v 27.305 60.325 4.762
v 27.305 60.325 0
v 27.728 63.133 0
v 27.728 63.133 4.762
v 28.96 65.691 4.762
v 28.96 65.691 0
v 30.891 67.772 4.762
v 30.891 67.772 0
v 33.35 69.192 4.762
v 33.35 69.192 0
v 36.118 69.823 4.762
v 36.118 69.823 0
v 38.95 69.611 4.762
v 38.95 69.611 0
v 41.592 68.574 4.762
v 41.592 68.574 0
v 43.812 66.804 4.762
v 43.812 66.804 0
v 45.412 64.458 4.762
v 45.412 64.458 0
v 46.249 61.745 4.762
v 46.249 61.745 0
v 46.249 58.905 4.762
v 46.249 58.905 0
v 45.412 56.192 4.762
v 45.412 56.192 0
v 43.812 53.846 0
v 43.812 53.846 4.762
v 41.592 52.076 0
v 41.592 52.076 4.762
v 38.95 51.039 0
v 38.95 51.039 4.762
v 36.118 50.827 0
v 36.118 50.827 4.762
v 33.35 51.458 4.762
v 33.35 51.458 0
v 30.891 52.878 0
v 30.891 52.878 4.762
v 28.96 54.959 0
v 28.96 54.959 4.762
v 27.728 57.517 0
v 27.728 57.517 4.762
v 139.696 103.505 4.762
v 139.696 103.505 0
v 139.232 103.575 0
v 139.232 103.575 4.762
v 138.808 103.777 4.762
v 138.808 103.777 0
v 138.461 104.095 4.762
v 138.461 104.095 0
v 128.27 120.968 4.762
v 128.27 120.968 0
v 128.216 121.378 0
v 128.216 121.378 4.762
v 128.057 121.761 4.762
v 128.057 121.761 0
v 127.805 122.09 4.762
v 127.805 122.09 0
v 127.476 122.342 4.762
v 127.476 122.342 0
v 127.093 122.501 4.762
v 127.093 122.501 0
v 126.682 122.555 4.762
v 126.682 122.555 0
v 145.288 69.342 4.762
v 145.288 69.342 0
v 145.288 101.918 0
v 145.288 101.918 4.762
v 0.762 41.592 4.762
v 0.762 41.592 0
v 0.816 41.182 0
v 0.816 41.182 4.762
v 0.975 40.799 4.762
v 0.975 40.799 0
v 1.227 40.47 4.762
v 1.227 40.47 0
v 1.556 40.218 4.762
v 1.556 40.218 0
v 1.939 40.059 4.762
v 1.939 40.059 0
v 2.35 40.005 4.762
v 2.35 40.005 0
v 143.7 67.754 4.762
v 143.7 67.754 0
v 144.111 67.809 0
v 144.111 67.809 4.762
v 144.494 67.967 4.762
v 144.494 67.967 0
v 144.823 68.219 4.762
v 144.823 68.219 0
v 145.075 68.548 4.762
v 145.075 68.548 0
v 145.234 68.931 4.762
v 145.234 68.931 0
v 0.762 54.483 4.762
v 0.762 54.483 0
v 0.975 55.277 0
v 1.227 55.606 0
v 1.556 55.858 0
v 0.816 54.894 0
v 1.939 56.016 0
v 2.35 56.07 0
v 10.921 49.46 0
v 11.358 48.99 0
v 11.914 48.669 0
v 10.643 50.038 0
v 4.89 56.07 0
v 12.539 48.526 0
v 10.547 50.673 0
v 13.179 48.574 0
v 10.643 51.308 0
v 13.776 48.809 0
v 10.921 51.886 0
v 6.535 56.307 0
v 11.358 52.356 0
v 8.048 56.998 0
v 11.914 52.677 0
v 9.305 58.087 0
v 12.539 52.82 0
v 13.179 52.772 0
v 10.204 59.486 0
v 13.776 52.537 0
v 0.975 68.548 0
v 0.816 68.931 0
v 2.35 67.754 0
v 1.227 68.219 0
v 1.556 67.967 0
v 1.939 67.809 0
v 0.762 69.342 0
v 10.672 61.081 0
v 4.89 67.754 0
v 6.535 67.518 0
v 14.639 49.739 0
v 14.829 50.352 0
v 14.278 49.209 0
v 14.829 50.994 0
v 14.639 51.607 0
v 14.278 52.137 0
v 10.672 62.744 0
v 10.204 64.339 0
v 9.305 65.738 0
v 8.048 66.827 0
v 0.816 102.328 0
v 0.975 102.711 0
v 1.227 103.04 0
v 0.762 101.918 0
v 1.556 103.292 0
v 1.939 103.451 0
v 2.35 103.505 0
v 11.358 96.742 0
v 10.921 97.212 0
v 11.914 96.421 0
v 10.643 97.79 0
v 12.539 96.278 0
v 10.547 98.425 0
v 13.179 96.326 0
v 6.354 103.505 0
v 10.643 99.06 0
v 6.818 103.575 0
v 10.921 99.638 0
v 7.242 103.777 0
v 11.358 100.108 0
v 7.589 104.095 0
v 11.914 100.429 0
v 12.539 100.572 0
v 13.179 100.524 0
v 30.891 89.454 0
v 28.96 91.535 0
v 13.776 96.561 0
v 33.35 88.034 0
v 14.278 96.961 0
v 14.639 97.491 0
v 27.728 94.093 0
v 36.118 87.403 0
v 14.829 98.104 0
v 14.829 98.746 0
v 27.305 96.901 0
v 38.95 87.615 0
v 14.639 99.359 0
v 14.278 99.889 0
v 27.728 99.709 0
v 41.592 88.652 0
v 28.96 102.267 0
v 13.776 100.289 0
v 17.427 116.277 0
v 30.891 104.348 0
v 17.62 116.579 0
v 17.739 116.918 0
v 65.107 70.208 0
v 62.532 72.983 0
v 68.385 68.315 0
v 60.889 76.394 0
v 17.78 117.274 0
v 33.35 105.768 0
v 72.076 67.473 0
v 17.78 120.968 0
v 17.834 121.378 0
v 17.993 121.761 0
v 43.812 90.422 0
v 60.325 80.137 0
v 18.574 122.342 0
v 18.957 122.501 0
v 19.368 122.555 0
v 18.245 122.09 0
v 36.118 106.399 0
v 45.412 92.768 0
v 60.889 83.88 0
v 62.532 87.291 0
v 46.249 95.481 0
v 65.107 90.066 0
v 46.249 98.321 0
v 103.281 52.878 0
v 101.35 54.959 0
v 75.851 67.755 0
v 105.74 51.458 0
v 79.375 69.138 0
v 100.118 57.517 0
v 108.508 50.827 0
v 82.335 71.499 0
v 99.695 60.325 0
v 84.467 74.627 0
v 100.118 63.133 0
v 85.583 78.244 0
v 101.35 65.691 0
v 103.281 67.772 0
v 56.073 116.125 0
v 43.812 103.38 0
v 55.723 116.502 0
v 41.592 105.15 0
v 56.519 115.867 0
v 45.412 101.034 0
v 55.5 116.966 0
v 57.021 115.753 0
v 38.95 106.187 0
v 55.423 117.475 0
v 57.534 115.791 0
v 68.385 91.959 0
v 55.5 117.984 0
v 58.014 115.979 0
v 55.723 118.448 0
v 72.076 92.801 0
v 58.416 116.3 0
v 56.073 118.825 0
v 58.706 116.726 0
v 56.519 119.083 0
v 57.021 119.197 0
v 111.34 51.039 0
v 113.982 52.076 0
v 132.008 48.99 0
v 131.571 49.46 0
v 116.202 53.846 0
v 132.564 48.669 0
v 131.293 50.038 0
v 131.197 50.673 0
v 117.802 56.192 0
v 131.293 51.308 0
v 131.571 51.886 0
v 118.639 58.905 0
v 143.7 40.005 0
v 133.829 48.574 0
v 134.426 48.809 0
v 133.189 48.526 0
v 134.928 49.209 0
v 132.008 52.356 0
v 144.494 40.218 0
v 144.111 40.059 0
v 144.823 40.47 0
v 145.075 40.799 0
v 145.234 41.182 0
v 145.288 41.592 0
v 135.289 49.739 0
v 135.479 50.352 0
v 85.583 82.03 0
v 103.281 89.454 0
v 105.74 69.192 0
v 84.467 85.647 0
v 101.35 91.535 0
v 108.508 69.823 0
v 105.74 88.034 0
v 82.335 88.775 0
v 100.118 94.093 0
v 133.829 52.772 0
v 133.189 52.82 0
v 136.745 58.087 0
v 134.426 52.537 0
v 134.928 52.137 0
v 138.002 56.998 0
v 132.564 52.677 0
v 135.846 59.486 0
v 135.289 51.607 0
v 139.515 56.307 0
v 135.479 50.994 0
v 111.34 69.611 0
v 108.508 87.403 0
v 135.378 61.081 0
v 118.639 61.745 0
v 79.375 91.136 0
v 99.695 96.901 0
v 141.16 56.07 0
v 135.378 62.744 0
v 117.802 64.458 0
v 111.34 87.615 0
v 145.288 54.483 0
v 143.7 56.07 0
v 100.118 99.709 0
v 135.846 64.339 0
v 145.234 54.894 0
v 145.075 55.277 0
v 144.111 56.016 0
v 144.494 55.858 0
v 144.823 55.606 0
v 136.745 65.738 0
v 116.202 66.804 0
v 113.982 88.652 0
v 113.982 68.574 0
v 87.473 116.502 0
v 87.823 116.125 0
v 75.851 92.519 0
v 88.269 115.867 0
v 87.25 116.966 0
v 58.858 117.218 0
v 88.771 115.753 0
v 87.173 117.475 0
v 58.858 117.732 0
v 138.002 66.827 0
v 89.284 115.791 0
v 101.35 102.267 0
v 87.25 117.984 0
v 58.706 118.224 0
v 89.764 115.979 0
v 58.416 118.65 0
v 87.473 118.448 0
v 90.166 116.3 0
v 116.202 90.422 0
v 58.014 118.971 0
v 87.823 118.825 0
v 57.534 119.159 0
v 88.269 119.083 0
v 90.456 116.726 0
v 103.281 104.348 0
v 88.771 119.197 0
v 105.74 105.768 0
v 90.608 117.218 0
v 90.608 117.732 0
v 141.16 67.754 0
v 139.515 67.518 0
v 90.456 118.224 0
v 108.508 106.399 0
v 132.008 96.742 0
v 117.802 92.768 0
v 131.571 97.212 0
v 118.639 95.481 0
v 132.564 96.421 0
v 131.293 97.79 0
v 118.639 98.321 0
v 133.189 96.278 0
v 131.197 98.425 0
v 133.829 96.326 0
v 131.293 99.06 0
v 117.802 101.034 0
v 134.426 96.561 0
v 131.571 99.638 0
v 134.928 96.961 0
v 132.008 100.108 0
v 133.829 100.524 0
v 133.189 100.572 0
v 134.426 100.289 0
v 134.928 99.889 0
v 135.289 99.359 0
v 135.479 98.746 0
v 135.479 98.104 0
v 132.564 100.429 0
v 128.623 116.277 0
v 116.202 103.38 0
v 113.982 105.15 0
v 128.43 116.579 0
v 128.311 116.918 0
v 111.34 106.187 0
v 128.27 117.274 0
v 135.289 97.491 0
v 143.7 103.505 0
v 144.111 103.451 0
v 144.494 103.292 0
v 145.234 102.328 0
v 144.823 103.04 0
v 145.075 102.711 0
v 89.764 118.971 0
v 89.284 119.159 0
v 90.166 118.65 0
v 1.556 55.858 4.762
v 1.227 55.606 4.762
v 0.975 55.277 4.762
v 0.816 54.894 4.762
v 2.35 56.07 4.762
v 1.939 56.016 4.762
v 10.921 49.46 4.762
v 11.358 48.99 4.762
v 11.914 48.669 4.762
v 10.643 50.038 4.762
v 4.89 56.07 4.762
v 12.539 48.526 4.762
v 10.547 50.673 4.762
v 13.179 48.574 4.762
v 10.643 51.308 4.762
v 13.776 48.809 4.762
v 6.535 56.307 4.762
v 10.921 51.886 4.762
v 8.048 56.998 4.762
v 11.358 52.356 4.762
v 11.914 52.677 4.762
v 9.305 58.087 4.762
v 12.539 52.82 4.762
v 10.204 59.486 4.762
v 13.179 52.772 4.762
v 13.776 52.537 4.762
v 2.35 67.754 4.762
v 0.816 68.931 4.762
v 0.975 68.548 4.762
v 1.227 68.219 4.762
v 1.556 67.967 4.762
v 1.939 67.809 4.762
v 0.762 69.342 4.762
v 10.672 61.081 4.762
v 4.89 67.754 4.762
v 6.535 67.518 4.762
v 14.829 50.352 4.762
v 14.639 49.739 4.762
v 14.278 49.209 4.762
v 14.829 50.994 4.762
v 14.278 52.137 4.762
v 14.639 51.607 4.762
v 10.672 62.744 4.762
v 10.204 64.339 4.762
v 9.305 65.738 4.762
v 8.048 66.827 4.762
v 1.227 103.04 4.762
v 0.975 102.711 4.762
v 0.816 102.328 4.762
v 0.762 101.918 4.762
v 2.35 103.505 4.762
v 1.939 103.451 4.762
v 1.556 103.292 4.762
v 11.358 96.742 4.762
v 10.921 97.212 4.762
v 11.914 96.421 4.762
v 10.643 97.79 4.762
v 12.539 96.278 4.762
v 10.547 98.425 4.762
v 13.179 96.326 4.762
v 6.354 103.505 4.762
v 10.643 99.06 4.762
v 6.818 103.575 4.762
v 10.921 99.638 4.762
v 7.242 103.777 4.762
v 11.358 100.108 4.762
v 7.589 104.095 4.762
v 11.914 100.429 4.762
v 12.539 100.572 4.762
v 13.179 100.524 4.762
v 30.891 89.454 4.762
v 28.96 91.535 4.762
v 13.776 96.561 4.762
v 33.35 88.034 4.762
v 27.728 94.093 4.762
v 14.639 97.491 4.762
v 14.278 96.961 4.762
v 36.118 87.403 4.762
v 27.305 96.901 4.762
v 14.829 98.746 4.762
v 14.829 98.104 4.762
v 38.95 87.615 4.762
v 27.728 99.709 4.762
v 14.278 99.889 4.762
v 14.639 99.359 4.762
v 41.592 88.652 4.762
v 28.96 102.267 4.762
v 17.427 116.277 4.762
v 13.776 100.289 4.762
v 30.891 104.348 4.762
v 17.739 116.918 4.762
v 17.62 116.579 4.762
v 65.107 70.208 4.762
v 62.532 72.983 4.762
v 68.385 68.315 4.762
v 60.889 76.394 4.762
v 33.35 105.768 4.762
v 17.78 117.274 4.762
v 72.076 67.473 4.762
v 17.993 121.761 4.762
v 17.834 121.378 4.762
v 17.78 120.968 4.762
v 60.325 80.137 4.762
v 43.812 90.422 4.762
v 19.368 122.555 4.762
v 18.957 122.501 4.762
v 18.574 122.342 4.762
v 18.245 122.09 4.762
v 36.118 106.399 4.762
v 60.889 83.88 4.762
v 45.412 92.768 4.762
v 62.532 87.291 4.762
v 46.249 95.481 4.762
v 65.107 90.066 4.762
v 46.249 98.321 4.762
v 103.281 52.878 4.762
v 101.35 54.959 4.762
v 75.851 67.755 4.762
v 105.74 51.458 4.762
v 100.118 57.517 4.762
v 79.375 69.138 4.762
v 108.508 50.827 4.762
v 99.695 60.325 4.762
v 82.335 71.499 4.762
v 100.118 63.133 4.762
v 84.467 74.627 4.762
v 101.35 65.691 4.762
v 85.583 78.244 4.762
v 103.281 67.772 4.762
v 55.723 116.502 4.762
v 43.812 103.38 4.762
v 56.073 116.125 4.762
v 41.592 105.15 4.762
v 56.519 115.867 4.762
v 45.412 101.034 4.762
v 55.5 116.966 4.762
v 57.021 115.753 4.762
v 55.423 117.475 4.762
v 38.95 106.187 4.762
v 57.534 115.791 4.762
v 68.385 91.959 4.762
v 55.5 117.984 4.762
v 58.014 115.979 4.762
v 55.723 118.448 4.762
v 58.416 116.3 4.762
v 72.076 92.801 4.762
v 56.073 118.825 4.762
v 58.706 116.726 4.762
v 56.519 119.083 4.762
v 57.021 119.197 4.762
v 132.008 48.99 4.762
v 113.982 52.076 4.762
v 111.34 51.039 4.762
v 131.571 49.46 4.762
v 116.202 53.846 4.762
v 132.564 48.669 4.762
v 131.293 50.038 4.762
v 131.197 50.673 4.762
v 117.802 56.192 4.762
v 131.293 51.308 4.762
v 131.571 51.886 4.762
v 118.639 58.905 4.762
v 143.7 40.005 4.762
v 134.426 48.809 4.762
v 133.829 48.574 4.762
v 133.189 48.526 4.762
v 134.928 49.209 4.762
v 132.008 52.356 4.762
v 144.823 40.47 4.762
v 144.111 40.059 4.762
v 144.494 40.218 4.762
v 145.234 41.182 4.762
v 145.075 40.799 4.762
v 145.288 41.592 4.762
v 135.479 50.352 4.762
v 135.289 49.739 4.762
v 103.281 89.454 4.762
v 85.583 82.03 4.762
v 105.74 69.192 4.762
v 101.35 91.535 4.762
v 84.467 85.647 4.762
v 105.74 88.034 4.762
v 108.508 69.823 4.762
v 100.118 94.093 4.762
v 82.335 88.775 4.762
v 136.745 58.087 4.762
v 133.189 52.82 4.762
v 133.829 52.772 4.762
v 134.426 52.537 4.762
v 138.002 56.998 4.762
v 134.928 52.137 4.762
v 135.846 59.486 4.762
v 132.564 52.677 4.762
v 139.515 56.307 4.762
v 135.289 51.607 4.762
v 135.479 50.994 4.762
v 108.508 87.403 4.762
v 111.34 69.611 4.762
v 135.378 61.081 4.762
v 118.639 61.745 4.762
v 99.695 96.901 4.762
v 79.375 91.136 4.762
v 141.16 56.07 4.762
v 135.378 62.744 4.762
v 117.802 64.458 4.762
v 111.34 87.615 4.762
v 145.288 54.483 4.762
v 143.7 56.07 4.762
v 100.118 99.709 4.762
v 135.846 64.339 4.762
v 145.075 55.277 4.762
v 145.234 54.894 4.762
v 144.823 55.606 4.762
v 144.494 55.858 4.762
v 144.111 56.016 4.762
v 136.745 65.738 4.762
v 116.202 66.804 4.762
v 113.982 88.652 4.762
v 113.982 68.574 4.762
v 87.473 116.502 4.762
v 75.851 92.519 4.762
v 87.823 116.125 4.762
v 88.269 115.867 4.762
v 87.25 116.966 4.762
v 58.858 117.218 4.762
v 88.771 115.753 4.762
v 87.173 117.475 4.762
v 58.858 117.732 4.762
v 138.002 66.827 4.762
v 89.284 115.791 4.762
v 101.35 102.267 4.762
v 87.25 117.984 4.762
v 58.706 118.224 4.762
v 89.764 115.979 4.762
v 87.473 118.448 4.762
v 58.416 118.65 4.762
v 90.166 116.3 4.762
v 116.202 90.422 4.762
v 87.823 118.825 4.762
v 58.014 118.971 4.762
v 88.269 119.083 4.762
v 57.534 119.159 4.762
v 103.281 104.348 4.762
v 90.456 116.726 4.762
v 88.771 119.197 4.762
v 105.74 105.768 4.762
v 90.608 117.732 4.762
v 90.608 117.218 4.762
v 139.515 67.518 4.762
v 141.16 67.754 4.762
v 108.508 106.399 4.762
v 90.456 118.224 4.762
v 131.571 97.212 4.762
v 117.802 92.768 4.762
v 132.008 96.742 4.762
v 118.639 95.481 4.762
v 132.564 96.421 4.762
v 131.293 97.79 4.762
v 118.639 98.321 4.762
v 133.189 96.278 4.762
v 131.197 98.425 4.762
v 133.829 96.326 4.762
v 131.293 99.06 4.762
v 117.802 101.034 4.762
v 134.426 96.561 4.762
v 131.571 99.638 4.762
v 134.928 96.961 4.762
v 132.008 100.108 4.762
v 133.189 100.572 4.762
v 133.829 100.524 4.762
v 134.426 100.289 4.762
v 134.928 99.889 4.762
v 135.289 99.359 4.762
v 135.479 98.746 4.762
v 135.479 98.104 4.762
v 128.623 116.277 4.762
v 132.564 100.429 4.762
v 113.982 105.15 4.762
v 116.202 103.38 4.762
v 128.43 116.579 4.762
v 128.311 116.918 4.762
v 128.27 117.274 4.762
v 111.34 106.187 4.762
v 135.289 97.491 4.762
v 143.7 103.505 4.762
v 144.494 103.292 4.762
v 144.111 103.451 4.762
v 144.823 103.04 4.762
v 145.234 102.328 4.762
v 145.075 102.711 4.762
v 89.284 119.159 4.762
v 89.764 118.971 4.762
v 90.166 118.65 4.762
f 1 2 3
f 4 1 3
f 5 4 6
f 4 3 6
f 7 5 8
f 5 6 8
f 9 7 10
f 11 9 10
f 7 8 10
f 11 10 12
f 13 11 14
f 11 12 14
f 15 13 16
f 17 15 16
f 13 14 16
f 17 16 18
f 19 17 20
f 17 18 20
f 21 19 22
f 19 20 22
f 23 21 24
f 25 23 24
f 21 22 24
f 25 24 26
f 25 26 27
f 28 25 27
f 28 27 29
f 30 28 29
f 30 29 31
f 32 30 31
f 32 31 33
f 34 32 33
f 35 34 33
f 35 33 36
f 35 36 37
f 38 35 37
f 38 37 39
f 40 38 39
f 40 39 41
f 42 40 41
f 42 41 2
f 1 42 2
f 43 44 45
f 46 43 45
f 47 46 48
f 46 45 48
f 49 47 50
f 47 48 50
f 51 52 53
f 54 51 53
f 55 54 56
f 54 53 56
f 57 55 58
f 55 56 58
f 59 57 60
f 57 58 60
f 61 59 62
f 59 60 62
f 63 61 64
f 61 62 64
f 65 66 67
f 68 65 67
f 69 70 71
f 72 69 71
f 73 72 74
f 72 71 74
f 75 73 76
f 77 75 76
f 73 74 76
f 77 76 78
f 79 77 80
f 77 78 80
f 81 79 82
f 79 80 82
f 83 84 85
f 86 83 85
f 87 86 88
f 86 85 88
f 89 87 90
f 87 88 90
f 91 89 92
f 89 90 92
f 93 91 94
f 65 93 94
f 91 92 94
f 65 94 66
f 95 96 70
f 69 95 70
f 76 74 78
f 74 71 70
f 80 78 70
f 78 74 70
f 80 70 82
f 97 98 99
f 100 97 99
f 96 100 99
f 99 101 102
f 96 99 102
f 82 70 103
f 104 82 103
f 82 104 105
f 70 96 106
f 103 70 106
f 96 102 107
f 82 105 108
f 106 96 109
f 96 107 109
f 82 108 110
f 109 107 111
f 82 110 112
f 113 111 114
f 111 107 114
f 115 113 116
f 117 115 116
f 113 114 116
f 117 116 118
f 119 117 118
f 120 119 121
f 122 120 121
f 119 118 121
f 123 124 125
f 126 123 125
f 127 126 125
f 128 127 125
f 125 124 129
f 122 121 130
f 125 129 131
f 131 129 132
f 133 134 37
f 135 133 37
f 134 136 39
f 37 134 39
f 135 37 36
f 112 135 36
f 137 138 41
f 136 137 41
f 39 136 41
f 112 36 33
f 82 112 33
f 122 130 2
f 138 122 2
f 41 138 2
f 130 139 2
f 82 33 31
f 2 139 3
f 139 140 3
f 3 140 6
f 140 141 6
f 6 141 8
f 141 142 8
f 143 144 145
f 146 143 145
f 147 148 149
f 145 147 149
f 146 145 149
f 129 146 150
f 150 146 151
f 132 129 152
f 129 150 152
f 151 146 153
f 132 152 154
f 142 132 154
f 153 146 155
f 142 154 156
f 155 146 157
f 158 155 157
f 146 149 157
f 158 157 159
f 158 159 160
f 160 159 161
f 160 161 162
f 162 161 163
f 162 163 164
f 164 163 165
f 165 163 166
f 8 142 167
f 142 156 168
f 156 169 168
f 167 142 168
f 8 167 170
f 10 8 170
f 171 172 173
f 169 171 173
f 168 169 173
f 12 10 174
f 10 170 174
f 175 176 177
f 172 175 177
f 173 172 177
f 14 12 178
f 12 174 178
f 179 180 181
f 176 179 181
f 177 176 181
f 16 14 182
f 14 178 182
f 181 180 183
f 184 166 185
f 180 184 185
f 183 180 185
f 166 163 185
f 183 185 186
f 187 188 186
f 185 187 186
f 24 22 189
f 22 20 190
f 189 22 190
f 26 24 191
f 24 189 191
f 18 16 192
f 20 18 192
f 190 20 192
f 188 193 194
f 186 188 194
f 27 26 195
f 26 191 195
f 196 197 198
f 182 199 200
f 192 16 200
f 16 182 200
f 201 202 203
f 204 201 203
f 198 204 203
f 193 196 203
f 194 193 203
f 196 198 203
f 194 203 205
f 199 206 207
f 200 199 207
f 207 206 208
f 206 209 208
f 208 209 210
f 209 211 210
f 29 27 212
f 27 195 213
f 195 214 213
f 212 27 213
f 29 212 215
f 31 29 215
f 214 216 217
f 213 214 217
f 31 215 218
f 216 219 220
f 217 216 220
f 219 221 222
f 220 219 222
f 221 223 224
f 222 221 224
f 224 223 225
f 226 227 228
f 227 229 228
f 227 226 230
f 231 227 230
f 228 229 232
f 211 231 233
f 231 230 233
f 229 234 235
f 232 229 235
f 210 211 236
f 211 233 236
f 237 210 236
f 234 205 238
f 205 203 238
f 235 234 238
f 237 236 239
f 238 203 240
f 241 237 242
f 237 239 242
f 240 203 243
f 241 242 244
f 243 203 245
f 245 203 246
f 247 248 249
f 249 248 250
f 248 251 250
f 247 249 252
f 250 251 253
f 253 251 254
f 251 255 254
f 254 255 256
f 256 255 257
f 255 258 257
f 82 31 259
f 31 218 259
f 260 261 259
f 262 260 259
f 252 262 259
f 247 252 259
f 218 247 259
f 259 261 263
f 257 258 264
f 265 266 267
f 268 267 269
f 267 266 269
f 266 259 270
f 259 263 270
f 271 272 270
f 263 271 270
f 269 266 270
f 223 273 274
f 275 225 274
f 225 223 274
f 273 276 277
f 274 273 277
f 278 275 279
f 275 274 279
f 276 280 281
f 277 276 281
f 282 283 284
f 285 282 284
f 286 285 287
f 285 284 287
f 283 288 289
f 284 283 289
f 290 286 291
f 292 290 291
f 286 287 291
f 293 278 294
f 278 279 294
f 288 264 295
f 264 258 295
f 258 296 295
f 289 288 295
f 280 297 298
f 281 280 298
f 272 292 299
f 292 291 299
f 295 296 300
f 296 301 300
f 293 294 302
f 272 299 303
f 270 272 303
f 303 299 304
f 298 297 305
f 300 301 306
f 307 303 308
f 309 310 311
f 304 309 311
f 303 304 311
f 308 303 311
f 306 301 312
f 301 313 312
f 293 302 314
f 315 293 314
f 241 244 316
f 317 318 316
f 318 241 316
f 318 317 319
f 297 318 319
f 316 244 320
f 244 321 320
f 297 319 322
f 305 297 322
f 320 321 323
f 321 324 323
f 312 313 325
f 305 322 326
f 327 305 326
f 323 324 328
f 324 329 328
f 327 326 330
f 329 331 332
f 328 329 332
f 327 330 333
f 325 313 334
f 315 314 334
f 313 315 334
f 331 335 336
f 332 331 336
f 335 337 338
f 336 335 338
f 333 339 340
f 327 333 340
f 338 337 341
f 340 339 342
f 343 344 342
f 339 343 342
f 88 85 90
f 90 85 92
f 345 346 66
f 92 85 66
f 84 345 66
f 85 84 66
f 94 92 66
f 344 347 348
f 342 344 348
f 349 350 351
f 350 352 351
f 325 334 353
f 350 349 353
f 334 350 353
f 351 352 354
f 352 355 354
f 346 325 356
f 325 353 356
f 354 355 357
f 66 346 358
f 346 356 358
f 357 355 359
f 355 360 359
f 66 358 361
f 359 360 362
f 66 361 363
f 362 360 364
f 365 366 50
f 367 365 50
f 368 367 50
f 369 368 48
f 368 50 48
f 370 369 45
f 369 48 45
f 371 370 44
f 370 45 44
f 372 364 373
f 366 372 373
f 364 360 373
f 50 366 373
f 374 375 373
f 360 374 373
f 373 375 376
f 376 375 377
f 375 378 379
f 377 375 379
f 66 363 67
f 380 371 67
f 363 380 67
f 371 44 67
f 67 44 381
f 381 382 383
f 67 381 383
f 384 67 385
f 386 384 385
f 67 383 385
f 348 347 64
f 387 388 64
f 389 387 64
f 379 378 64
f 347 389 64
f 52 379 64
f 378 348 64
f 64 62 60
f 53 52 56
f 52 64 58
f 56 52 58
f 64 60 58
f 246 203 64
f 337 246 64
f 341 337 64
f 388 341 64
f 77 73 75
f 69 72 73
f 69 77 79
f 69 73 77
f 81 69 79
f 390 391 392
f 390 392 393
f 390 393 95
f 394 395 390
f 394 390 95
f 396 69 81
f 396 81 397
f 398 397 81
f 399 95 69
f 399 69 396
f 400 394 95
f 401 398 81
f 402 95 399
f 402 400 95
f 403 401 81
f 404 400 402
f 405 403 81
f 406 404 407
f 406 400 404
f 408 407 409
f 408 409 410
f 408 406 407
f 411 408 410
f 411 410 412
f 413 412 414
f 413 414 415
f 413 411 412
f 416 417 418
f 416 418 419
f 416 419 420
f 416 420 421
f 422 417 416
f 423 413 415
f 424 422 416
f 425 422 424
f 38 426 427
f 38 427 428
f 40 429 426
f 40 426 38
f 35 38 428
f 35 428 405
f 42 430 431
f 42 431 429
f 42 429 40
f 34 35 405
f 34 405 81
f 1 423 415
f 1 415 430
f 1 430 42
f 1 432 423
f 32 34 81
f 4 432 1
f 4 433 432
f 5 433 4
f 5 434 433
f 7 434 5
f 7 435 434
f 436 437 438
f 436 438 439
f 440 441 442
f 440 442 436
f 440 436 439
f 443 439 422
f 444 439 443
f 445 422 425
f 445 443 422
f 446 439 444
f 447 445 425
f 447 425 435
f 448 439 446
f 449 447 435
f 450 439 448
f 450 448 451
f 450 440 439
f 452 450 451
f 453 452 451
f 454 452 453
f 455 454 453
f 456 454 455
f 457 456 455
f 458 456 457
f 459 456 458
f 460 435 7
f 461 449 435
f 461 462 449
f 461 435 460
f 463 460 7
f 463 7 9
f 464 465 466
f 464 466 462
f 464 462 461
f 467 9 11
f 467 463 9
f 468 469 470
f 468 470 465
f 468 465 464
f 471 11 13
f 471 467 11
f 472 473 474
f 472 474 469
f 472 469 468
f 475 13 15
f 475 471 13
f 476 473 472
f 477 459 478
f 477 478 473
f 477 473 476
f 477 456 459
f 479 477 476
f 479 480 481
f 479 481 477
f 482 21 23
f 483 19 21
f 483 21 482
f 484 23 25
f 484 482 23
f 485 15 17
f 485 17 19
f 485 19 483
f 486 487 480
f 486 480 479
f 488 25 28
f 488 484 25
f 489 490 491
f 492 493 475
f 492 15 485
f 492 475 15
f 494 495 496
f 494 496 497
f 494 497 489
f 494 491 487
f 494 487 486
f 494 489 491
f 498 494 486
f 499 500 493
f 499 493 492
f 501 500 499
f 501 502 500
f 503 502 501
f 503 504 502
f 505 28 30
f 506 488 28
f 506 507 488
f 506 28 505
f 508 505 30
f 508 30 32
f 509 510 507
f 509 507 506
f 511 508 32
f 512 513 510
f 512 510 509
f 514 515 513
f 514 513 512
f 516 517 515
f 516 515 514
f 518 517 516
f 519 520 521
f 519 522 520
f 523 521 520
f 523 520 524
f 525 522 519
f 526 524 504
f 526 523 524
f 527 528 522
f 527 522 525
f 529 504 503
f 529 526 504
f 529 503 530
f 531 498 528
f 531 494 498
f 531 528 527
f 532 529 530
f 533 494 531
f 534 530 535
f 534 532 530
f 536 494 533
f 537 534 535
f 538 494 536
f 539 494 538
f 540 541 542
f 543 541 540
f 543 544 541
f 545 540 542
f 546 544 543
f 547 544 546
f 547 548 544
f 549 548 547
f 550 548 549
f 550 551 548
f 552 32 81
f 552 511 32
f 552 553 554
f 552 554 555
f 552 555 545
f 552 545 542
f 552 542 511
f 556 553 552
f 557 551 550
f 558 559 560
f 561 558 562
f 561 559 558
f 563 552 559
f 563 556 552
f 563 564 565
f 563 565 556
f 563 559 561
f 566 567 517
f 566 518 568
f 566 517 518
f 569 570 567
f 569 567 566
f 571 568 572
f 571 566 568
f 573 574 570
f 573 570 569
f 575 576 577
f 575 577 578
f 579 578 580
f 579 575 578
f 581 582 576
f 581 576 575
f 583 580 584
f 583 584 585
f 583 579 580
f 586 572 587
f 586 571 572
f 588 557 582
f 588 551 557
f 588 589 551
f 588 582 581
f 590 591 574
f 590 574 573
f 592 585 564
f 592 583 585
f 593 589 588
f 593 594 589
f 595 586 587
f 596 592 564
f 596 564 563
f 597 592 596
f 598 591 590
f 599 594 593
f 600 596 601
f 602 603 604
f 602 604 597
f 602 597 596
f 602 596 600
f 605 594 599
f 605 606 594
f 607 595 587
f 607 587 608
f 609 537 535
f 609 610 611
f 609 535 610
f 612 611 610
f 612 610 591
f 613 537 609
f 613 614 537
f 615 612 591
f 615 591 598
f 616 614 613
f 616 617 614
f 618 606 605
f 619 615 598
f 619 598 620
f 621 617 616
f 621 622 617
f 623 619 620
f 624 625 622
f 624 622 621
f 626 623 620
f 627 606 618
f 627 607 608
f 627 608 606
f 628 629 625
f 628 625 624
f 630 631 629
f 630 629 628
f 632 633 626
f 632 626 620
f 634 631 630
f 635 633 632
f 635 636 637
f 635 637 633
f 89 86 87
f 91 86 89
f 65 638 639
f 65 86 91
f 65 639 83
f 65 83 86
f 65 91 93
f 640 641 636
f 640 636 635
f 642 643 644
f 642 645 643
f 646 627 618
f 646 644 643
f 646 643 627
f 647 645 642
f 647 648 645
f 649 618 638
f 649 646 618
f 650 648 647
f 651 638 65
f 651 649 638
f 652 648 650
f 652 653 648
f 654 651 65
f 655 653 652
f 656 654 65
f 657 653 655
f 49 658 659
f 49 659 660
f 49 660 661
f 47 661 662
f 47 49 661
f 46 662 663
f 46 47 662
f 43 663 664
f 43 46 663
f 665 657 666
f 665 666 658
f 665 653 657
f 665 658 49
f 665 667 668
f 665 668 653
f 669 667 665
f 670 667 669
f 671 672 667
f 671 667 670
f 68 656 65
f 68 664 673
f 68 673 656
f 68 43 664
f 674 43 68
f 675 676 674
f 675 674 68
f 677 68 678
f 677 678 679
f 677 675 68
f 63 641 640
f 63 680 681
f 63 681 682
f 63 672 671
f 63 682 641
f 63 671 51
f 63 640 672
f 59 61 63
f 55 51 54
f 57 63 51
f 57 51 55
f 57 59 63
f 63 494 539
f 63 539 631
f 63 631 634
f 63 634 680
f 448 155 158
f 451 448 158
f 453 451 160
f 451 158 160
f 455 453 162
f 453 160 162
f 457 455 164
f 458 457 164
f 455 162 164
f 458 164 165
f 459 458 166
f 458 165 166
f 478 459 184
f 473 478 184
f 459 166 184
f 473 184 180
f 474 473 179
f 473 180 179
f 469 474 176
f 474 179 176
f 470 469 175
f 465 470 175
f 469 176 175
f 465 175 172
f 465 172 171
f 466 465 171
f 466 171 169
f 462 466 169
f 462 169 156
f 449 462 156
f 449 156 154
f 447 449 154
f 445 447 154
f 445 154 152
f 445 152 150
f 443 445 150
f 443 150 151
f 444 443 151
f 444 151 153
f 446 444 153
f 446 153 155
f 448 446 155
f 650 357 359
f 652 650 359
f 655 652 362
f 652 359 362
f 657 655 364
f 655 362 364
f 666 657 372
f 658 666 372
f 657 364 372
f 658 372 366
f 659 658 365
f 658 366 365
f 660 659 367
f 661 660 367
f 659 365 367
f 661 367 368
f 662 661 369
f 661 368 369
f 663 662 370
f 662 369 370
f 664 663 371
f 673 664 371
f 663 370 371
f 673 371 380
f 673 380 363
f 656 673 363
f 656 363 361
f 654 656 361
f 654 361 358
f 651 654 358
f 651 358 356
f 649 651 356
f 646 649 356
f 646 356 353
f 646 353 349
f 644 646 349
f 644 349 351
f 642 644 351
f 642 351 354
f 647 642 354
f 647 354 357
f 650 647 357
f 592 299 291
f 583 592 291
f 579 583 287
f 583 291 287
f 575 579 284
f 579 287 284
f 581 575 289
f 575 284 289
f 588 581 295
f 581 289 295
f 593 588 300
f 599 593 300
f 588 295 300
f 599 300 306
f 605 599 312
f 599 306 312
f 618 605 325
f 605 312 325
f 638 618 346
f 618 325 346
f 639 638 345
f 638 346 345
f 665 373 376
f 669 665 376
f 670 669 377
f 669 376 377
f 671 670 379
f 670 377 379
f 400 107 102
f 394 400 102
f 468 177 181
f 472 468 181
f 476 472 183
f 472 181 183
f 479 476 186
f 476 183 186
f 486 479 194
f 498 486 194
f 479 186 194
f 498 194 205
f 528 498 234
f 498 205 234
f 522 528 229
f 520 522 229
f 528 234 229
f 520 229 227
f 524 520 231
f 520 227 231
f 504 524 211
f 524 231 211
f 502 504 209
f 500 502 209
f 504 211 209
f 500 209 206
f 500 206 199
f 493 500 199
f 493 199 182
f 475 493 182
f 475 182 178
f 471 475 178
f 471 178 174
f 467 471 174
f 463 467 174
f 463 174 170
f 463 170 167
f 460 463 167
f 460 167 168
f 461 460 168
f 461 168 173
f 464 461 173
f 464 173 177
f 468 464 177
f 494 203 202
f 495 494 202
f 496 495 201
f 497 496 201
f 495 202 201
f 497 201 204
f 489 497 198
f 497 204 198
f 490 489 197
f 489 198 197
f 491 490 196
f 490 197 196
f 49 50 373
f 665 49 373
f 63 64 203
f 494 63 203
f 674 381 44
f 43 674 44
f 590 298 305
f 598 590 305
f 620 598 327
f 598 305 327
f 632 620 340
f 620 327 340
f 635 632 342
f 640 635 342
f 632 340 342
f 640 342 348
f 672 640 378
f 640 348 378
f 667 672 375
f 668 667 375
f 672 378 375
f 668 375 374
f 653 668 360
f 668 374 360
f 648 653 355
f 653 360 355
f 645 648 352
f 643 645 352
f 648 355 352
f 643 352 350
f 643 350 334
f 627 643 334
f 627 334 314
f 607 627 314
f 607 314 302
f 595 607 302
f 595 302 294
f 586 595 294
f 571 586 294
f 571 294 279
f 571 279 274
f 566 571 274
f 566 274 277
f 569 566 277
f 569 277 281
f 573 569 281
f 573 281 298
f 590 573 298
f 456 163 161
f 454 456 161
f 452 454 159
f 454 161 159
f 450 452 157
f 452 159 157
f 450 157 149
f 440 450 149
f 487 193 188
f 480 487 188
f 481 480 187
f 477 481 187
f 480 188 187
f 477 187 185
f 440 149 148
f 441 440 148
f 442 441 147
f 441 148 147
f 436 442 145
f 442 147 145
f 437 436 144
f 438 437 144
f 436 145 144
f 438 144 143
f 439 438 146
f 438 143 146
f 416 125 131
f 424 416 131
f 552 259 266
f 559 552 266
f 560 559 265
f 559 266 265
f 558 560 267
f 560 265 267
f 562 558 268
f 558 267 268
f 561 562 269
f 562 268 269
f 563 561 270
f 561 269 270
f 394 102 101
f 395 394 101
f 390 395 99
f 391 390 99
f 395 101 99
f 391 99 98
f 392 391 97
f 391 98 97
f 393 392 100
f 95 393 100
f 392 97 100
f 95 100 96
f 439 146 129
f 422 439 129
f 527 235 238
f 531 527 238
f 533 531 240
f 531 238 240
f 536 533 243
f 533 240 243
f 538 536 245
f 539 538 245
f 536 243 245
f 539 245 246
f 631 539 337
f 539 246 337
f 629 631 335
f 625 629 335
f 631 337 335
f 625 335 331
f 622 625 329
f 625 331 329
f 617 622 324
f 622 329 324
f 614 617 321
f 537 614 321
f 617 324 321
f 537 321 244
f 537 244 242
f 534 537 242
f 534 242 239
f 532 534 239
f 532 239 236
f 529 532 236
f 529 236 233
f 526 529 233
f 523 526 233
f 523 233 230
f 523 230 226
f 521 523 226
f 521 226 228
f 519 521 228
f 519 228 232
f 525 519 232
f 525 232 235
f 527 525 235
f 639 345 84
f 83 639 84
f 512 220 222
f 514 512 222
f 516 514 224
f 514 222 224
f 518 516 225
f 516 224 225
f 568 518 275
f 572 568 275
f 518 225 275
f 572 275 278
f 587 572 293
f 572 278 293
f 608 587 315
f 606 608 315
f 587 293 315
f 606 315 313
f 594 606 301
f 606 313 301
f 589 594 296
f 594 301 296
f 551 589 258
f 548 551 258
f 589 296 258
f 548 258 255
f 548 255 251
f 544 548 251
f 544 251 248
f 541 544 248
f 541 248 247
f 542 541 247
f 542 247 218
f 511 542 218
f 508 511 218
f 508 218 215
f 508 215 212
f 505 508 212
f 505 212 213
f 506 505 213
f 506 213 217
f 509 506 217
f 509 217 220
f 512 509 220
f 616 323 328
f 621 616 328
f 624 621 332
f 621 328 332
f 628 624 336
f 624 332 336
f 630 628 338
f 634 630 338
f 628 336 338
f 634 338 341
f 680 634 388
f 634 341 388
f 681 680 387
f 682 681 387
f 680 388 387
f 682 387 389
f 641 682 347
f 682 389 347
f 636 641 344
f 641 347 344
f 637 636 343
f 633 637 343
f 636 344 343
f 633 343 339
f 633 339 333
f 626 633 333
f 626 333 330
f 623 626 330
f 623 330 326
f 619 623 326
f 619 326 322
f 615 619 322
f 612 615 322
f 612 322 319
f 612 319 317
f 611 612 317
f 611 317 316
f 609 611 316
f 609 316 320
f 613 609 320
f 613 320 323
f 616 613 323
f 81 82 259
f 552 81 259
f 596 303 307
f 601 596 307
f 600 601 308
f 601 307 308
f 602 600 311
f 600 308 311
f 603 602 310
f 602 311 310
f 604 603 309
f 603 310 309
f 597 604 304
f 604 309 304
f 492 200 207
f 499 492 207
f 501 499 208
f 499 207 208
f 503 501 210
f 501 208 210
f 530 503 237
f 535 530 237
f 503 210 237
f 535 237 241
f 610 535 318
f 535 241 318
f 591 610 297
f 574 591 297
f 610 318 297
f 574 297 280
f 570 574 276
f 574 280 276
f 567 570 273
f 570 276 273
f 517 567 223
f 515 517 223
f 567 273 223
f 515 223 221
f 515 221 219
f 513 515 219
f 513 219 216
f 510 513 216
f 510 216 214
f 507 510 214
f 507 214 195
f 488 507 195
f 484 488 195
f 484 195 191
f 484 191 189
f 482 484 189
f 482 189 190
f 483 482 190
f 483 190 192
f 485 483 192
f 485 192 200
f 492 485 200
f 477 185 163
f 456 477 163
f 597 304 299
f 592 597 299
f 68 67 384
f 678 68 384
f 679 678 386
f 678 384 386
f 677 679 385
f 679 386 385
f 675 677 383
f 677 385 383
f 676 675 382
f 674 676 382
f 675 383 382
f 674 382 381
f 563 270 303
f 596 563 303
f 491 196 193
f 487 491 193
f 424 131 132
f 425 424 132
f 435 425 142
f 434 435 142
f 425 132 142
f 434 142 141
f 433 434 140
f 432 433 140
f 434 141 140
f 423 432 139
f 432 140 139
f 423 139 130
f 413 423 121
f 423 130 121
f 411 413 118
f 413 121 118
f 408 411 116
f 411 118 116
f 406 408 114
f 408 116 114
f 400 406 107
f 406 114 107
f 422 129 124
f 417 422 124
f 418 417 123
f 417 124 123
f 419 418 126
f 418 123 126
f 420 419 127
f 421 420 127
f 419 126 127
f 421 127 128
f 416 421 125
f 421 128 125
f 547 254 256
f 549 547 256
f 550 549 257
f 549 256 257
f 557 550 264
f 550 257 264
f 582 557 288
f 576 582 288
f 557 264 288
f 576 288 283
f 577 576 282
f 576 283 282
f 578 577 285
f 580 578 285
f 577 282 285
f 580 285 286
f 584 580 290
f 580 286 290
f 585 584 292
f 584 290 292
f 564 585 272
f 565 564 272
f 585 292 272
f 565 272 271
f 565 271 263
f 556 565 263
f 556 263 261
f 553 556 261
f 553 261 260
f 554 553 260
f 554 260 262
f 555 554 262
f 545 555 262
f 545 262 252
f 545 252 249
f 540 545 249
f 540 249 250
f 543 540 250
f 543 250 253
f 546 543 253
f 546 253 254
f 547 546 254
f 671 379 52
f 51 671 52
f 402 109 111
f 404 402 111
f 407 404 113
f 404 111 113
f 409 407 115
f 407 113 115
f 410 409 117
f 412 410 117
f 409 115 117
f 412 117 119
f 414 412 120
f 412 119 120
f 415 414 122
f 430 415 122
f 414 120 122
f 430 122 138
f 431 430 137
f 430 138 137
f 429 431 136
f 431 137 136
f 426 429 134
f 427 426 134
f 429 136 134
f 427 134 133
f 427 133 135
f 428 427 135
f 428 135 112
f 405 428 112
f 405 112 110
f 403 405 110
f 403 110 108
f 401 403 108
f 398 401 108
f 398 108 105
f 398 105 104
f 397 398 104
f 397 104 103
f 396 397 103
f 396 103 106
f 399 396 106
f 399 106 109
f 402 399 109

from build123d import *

# Parameters (mm, degrees)
BOSS_EXTRUDE1_DEPTH         = 4.7625
F_6_CLEARANCE_HOLE1_D       = 4.3053
F_3_4_0_75_DIAMETER_HOLE1_D = 19.05
F_1_1_DIAMETER_HOLE1_D      = 25.4
F_4_CLEARANCE_HOLE1_D       = 3.4544


with BuildPart() as part:
    # Sketch1 → Boss-Extrude1 (new body)
    with BuildSketch(Plane.XY):
        with BuildLine():
            Line((0.762, 54.483), (0.762, 41.5925))
            ThreePointArc((0.762, 41.5925), (1.226967985, 40.469967985), (2.3495, 40.005))
            Line((2.3495, 40.005), (143.7005, 40.005))
            ThreePointArc((143.7005, 40.005), (144.823032015, 40.469967985), (145.288, 41.5925))
            Line((145.288, 41.5925), (145.288, 54.483))
            ThreePointArc((145.288, 54.483), (144.823032015, 55.605532015), (143.7005, 56.0705))
            Line((143.7005, 56.0705), (141.1605, 56.0705))
            ThreePointArc((141.1605, 56.0705), (135.3185, 61.9125), (141.1605, 67.7545))
            Line((141.1605, 67.7545), (143.7005, 67.7545))
            ThreePointArc((143.7005, 67.7545), (144.823032015, 68.219467985), (145.288, 69.342))
            Line((145.288, 69.342), (145.288, 101.9175))
            ThreePointArc((145.288, 101.9175), (144.823032015, 103.040032015), (143.7005, 103.505))
            Line((143.7005, 103.505), (139.696431174, 103.505))
            ThreePointArc((139.696431174, 103.505), (139.012088949, 103.660078285), (138.46144955, 104.095014842))
            Line((138.46144955, 104.095014842), (128.622518376, 116.276548677))
            ThreePointArc((128.622518376, 116.276548677), (128.360721864, 116.745061754), (128.27, 117.274033834))
            Line((128.27, 117.274033834), (128.27, 120.9675))
            ThreePointArc((128.27, 120.9675), (127.805032015, 122.090032015), (126.6825, 122.555))
            Line((126.6825, 122.555), (19.3675, 122.555))
            ThreePointArc((19.3675, 122.555), (18.244967985, 122.090032015), (17.78, 120.9675))
            Line((17.78, 120.9675), (17.78, 117.274033834))
            ThreePointArc((17.78, 117.274033834), (17.689278136, 116.745061754), (17.427481624, 116.276548677))
            Line((17.427481624, 116.276548677), (7.58855045, 104.095014842))
            ThreePointArc((7.58855045, 104.095014842), (7.037911051, 103.660078285), (6.353568826, 103.505))
            Line((6.353568826, 103.505), (2.3495, 103.505))
            ThreePointArc((2.3495, 103.505), (1.226967985, 103.040032015), (0.762, 101.9175))
            Line((0.762, 101.9175), (0.762, 69.342))
            ThreePointArc((0.762, 69.342), (1.226967985, 68.219467985), (2.3495, 67.7545))
            Line((2.3495, 67.7545), (4.8895, 67.7545))
            ThreePointArc((4.8895, 67.7545), (10.7315, 61.9125), (4.8895, 56.0705))
            Line((4.8895, 56.0705), (2.3495, 56.0705))
            ThreePointArc((2.3495, 56.0705), (1.226967985, 55.605532015), (0.762, 54.483))
        make_face()
    extrude(amount=BOSS_EXTRUDE1_DEPTH)

    # #6 Clearance Hole1 (through all)
    with Locations(Plane.XY.offset(4.7625)):
        with Locations((12.7, 98.425), (133.35, 98.425), (133.35, 50.673), (12.7, 50.673)):
            Hole(F_6_CLEARANCE_HOLE1_D / 2)

    # 3/4 (0.75) Diameter Hole1 (through all)
    with Locations(Plane.XY.offset(4.7625)):
        with Locations((36.83, 96.901), (109.22, 96.901), (109.22, 60.325), (36.83, 60.325)):
            Hole(F_3_4_0_75_DIAMETER_HOLE1_D / 2)

    # 1 (1) Diameter Hole1 (through all)
    with Locations(Plane.XY.offset(4.7625)):
        with Locations((73.025, 80.137)):
            Hole(F_1_1_DIAMETER_HOLE1_D / 2)

    # #4 Clearance Hole1 (through all)
    with Locations(Plane.XY.offset(4.7625)):
        with Locations((57.15, 117.475), (88.9, 117.475)):
            Hole(F_4_CLEARANCE_HOLE1_D / 2)


solid = part.part
